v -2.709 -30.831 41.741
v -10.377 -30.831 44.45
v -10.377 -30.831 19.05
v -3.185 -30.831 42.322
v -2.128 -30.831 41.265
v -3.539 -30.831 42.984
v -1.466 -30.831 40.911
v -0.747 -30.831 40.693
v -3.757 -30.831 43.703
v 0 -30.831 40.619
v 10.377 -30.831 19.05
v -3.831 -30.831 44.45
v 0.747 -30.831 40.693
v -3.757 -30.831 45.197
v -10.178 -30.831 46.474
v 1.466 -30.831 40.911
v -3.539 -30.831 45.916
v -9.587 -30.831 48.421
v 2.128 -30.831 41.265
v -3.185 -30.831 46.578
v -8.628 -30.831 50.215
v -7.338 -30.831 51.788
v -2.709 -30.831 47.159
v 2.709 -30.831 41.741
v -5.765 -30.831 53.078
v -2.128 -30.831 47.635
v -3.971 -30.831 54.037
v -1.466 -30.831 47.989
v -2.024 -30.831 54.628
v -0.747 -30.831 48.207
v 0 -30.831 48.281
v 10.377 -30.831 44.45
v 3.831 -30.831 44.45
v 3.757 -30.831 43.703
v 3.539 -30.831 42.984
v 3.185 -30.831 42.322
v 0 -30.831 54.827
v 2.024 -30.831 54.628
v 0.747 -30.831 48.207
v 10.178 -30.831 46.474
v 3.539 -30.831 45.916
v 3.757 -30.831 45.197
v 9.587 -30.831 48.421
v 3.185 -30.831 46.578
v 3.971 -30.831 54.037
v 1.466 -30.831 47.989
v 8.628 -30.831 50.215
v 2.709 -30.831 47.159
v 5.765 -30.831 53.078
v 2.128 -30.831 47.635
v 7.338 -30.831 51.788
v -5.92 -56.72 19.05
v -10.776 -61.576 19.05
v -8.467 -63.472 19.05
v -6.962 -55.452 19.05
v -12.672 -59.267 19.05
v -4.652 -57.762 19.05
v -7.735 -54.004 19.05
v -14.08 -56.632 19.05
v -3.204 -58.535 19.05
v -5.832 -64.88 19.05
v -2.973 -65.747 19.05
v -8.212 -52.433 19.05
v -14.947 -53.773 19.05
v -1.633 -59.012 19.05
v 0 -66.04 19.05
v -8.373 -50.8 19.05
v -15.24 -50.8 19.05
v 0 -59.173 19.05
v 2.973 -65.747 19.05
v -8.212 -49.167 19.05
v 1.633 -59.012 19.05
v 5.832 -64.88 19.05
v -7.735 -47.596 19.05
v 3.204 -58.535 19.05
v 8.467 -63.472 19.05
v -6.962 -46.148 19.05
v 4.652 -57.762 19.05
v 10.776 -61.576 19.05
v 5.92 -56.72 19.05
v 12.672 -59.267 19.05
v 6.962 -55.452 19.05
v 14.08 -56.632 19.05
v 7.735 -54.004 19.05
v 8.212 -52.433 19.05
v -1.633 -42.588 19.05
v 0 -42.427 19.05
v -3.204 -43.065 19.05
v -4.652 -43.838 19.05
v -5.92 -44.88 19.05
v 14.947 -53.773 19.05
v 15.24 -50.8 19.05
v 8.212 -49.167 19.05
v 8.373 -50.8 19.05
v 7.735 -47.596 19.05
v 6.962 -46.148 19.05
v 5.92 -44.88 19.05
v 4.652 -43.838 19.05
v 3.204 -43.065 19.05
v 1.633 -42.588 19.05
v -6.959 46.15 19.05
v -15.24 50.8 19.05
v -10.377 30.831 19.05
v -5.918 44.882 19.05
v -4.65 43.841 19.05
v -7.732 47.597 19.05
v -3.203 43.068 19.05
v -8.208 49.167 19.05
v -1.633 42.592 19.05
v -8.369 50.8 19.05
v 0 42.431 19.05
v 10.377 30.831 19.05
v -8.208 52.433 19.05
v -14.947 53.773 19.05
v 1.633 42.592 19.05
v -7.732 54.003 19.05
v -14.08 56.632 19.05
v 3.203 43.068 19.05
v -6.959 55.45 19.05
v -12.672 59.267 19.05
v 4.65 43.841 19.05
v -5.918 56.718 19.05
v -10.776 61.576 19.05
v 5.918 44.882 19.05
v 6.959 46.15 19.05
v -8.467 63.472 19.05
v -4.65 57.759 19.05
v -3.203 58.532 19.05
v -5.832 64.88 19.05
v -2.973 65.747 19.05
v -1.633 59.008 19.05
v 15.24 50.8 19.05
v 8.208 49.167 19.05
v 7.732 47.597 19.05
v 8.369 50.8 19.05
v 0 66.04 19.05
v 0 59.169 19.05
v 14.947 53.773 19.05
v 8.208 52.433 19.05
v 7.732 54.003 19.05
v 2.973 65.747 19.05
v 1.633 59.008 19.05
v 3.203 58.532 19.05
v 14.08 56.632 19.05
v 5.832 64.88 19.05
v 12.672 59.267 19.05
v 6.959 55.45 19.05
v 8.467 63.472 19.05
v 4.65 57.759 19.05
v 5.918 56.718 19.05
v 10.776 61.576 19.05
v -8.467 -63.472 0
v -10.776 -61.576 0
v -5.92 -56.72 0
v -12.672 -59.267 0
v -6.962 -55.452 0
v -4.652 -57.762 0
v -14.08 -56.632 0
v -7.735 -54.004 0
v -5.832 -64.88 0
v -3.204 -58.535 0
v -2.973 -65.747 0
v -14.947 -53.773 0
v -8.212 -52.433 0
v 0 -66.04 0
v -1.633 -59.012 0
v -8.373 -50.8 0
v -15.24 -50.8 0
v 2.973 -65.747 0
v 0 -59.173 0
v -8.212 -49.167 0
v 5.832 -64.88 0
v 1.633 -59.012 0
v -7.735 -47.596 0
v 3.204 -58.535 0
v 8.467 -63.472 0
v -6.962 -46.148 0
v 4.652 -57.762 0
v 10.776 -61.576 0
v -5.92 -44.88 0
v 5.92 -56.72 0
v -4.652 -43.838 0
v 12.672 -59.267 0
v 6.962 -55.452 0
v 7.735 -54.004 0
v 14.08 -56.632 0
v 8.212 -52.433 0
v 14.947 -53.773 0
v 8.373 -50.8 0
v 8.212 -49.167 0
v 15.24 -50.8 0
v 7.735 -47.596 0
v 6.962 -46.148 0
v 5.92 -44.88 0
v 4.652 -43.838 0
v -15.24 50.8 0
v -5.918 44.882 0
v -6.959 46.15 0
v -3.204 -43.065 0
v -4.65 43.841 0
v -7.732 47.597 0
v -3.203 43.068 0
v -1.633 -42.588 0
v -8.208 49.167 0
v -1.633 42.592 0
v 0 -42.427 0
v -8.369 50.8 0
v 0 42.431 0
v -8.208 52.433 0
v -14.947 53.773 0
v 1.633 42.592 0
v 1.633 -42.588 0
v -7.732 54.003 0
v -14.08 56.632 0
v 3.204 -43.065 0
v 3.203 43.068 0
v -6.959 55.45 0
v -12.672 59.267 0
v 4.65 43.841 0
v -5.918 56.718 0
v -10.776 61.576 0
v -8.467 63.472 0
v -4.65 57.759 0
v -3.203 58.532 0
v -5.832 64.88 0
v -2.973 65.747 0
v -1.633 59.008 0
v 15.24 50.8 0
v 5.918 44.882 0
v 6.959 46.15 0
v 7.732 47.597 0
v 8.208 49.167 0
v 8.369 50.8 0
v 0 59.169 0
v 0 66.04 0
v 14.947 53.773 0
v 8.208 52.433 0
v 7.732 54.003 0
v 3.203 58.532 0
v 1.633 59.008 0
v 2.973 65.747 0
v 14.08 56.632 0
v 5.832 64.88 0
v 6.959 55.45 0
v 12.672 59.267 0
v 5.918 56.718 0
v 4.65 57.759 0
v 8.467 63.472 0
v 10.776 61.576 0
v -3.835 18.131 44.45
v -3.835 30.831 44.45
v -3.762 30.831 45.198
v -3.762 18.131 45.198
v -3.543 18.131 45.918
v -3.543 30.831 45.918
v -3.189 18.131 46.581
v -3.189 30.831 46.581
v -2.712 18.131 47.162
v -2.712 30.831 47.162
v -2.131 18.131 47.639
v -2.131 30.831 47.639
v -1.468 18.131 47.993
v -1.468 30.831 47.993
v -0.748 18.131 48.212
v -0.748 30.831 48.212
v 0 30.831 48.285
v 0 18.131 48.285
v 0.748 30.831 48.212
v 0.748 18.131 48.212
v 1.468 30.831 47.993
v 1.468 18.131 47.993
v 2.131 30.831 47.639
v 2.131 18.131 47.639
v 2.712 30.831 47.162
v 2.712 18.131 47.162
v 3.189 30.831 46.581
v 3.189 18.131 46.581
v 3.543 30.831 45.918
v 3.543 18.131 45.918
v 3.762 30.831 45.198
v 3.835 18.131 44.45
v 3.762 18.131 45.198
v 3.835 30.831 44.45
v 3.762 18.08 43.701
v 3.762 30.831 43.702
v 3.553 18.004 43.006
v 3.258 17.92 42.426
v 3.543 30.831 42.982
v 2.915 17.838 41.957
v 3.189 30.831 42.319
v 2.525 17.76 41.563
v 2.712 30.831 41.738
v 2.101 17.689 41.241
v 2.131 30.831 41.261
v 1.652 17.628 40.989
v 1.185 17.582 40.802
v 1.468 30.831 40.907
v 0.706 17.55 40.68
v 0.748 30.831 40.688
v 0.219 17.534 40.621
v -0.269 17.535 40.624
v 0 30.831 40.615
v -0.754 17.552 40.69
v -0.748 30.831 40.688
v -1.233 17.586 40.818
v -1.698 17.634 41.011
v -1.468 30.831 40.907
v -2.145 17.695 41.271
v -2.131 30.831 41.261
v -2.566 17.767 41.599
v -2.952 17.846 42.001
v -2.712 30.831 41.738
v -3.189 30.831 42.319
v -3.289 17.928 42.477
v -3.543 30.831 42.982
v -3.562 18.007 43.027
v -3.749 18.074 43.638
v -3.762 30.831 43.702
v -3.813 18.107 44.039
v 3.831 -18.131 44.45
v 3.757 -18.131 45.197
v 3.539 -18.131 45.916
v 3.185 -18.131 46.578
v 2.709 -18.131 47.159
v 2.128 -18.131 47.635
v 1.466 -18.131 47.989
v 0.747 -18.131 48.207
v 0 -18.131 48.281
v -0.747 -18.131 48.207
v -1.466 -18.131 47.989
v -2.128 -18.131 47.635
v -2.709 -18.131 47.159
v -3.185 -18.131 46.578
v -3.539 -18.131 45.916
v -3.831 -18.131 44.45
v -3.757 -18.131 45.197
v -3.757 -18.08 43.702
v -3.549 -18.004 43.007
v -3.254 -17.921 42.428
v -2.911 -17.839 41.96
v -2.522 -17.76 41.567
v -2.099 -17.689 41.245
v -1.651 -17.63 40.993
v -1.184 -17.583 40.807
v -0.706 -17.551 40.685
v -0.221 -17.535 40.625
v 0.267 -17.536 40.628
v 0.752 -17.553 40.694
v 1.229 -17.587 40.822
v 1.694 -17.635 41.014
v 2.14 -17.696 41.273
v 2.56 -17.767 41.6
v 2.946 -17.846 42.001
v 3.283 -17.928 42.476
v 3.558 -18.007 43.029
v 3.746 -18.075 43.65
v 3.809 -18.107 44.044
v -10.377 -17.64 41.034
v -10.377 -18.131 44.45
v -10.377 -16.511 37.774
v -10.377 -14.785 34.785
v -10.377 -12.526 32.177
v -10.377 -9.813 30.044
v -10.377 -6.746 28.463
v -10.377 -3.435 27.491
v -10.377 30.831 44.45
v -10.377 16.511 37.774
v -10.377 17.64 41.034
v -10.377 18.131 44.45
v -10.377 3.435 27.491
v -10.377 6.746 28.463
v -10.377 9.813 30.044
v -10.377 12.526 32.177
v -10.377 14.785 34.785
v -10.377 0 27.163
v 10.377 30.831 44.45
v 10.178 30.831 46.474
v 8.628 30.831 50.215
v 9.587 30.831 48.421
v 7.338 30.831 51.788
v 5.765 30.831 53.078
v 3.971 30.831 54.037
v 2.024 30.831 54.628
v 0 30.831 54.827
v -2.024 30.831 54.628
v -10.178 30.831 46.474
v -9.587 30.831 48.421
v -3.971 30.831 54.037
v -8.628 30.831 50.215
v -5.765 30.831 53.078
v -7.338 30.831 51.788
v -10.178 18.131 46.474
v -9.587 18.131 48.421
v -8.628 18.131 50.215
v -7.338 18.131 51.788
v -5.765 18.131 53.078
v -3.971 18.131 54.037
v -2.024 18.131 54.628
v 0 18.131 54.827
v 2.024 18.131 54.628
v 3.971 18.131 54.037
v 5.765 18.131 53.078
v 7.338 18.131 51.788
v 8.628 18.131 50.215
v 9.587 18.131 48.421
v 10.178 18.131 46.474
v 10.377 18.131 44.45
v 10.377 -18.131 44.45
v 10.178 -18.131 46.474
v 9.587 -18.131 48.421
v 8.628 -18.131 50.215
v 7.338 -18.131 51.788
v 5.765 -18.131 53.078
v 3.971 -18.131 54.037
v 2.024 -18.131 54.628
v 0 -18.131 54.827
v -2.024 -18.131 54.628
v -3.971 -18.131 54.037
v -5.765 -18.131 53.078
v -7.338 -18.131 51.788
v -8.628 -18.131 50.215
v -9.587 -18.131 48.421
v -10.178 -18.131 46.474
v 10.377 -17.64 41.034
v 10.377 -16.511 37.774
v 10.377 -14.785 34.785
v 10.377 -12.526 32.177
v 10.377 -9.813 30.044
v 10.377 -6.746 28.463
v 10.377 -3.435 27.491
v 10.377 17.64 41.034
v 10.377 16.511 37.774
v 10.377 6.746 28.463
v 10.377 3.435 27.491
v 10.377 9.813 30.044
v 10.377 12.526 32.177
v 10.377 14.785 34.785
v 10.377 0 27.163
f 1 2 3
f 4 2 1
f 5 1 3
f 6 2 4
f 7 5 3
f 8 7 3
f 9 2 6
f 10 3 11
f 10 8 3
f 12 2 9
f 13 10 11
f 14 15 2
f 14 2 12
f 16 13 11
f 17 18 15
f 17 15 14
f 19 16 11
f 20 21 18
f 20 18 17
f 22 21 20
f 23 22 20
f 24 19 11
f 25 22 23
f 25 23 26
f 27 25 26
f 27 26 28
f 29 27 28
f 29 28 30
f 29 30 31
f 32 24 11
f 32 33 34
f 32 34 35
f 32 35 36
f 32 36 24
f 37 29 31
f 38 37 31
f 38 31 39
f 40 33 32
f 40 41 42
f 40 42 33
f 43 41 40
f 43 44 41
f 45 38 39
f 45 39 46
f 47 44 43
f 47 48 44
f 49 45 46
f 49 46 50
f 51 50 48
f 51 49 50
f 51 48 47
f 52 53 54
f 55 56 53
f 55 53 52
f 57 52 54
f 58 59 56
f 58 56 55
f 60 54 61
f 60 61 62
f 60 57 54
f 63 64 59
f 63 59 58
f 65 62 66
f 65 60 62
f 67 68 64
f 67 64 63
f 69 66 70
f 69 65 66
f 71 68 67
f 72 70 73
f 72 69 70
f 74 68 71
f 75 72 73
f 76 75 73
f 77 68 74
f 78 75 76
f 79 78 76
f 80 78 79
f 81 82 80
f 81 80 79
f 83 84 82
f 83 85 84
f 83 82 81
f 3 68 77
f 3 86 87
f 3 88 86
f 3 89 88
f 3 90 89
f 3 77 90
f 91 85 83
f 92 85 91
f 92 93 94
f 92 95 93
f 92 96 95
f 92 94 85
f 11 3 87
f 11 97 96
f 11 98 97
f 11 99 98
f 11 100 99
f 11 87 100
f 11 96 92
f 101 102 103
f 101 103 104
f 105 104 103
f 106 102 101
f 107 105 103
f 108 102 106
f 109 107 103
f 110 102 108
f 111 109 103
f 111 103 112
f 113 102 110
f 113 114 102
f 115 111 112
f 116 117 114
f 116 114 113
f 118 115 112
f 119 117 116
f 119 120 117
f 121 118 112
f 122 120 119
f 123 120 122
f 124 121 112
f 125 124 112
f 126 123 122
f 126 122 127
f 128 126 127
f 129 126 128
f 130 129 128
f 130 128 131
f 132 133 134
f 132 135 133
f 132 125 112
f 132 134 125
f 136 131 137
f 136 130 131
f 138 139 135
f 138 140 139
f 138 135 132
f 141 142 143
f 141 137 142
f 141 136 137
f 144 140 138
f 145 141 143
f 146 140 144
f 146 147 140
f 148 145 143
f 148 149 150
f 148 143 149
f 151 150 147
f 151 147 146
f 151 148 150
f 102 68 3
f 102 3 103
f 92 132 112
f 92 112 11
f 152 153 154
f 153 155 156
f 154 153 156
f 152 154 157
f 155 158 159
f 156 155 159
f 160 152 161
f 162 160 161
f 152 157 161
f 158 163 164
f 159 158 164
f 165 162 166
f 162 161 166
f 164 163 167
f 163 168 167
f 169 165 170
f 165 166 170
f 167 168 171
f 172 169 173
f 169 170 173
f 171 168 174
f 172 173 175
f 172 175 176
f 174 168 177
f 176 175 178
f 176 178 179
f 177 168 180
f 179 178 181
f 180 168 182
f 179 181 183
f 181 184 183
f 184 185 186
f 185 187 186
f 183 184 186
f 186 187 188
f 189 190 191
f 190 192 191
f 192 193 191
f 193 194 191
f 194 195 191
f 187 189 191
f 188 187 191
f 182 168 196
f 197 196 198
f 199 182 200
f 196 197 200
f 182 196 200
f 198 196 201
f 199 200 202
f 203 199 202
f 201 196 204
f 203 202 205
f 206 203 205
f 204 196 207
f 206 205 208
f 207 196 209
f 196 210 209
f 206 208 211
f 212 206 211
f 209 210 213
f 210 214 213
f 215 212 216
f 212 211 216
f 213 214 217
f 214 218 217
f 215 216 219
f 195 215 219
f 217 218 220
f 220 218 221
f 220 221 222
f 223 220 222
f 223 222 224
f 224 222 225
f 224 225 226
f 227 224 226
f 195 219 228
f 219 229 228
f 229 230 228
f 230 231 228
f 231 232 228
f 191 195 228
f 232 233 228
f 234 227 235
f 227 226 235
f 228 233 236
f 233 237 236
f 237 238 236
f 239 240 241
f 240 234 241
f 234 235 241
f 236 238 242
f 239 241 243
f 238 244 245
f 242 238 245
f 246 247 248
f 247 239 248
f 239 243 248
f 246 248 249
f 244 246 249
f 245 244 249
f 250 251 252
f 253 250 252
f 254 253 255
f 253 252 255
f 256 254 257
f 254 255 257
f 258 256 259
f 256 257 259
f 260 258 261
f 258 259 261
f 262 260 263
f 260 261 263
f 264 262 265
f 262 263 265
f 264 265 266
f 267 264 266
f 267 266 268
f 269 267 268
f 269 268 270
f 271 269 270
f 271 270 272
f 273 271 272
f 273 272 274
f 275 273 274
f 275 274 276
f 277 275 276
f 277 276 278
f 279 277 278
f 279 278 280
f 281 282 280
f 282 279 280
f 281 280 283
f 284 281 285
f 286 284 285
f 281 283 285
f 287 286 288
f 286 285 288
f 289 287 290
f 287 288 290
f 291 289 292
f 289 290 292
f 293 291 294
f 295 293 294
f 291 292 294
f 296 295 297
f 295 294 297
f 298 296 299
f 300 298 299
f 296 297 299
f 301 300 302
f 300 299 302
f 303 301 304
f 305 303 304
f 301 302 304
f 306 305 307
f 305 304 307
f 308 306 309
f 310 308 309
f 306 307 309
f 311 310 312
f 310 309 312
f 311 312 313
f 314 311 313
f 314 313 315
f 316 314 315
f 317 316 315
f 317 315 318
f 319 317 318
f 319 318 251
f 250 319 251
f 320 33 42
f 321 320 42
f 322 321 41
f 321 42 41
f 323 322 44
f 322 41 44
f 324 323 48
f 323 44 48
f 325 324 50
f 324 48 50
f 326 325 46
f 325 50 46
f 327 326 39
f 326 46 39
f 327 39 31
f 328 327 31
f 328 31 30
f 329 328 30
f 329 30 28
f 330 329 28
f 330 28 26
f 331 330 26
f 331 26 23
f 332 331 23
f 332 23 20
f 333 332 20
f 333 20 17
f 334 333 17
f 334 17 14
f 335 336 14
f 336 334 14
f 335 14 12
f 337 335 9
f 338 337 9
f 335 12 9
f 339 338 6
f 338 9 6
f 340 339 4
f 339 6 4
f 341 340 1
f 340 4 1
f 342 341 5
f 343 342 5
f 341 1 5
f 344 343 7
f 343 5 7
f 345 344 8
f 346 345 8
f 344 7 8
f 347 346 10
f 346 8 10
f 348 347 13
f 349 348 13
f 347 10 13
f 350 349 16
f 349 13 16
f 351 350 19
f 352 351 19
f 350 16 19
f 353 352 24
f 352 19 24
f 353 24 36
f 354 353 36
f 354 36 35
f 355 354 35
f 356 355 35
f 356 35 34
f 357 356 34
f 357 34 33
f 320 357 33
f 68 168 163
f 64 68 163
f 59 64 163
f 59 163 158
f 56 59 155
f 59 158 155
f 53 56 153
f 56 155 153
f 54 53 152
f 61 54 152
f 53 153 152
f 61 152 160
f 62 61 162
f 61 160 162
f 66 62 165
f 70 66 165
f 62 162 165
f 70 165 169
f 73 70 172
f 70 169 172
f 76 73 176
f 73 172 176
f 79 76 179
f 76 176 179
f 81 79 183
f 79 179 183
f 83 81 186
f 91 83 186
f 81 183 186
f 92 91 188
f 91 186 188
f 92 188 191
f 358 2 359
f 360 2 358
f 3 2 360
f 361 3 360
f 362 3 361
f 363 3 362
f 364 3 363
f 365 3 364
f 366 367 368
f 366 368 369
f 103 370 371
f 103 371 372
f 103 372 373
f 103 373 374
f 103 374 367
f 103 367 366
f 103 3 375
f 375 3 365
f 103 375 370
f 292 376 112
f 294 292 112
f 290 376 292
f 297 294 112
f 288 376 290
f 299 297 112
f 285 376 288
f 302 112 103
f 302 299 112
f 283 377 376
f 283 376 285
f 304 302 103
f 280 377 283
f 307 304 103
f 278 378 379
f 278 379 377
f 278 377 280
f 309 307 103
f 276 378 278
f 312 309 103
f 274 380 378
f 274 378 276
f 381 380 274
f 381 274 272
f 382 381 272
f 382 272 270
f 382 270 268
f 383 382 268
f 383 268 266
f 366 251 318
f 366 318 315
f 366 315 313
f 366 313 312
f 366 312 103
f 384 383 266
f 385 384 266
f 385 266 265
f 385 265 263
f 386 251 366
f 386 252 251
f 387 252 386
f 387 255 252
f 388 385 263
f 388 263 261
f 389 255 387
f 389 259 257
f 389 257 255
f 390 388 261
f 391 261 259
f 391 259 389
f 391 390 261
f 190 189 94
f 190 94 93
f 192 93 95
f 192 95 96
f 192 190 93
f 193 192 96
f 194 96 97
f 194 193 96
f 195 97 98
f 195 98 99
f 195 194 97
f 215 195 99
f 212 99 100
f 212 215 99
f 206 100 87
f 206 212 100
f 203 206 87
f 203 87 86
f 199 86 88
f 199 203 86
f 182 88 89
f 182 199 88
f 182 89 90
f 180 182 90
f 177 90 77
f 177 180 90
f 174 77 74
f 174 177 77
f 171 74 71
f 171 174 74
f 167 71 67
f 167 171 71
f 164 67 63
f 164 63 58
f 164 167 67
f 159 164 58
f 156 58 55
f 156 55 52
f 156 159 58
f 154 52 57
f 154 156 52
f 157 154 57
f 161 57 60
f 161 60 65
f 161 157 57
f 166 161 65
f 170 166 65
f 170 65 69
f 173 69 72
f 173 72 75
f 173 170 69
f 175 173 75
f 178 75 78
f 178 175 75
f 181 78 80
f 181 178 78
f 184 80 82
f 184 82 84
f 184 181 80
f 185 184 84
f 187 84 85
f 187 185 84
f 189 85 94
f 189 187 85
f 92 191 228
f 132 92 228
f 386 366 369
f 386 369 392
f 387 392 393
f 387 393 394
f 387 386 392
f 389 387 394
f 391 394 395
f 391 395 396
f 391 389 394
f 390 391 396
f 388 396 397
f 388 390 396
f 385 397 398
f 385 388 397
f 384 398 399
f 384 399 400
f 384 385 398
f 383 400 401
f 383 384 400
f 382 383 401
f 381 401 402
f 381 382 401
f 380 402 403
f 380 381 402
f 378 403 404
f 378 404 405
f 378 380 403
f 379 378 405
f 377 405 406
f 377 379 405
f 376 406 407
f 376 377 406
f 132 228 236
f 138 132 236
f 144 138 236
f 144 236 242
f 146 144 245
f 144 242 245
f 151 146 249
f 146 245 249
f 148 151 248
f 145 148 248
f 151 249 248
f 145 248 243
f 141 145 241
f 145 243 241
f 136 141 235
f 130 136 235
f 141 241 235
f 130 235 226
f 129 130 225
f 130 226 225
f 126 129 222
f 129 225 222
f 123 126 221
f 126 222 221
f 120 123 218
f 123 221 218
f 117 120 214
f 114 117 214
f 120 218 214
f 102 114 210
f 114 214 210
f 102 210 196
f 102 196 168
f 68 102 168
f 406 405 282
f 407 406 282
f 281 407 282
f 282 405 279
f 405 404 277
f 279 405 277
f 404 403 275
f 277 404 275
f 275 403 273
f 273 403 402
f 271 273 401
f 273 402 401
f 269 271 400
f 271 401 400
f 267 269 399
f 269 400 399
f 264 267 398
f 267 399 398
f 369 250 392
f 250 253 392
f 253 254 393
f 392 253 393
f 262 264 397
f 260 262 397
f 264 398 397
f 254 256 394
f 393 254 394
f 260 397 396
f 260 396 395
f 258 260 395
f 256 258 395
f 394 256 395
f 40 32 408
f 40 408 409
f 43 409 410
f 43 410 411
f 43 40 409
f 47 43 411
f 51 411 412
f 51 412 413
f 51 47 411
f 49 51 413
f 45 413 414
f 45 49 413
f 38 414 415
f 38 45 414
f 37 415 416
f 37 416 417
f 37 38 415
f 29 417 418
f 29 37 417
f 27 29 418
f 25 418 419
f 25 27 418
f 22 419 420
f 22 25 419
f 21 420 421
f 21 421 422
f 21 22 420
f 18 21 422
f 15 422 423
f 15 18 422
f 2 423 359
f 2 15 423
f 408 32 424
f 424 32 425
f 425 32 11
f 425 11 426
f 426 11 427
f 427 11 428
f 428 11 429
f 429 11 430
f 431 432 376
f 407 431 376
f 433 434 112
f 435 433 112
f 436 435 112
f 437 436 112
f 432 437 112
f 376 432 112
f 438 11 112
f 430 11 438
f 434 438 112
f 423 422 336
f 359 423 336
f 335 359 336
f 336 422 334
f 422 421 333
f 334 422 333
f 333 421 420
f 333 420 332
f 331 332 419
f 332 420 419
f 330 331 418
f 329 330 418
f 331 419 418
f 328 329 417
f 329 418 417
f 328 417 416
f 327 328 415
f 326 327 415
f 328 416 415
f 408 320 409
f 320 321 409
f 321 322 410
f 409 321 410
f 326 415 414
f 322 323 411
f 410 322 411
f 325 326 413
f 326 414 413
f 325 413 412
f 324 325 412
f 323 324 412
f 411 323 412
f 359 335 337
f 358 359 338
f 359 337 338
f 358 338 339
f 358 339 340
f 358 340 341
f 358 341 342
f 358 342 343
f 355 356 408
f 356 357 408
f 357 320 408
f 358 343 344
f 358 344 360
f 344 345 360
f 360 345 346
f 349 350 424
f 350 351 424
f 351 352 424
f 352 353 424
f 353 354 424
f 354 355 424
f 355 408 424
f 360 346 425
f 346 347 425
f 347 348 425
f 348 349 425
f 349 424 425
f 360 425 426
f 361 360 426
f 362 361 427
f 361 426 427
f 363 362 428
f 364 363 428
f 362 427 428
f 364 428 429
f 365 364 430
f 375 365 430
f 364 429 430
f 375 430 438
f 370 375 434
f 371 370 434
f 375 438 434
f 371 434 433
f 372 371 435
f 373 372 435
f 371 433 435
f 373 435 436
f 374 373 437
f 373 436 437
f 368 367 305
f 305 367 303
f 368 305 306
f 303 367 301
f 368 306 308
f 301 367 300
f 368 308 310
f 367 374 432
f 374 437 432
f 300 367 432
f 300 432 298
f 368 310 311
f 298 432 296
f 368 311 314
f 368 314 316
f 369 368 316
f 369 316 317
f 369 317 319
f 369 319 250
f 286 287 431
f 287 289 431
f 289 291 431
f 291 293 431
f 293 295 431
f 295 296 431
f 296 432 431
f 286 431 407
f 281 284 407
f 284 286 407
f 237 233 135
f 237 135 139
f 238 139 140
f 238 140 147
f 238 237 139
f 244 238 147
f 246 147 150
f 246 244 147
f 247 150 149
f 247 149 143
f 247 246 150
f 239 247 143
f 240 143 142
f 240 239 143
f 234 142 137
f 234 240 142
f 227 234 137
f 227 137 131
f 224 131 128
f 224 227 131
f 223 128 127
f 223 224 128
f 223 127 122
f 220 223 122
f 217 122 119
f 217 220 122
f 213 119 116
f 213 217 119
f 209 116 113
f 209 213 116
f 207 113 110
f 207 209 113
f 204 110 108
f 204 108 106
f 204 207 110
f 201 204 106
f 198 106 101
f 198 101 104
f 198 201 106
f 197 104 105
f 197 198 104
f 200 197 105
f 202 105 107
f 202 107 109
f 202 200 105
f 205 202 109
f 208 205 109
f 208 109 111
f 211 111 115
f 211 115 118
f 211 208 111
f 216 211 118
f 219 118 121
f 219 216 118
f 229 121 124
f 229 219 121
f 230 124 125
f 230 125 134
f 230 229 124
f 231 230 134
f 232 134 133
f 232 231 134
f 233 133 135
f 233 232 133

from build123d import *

# Parameters (mm, degrees)
F0_R      = 8.37282
F0_R_2    = 8.3693
F1_DEPTH  = 19.05
F2_W      = 20.754474
F2_H      = 61.66184
F3_DEPTH  = 25.4
F5_DEPTH  = 25.4
F7_DEPTH  = 12.7
F6_R      = 3.8309
F8_DEPTH  = 15.24
F10_DEPTH = 12.7
F9_R      = 3.8354
F11_DEPTH = 15.24


with BuildPart() as f1:
    # F0 (on Top) → F1 (new body)
    with BuildSketch(Plane.XY):
        with BuildLine():
            Line((-15.24, 50.8), (-15.24, 0))
            Line((-15.24, 0), (-15.24, -50.8))
            ThreePointArc((-15.24, -50.8), (0, -66.04), (15.24, -50.8))
            Line((15.24, -50.8), (15.24, 0))
            Line((15.24, 0), (15.24, 50.8))
            ThreePointArc((15.24, 50.8), (0, 66.04), (-15.24, 50.8))
        make_face()
        with Locations((0, -50.8)):
            Circle(F0_R, mode=Mode.SUBTRACT)
        with Locations((0, 50.8)):
            Circle(F0_R_2, mode=Mode.SUBTRACT)
    extrude(amount=F1_DEPTH)

    # F2 (on face) → F3 (join)
    with BuildSketch(Plane.XY.offset(19.05)):
        Rectangle(F2_W, F2_H)
    extrude(amount=F3_DEPTH)

    # F4 (on face) → F5 (cut)
    with BuildSketch(Plane.YZ.offset(10.377237)):
        with BuildLine():
            Line((18.13092, 44.45), (-18.13092, 44.45))
            ThreePointArc((-18.13092, 44.45), (0, 27.163165), (18.13092, 44.45))
        make_face()
    extrude(amount=-F5_DEPTH, mode=Mode.SUBTRACT)

    # F6 (on face) → F7 (join)
    with BuildSketch(Plane.XZ.offset(30.83092)):
        with BuildLine():
            Line((3.8309, 44.45), (10.377237, 44.45))
            ThreePointArc((10.377237, 44.45), (0, 54.827237), (-10.377237, 44.45))
            Line((-10.377237, 44.45), (-3.8309, 44.45))
            ThreePointArc((-3.8309, 44.45), (0, 48.2809), (3.8309, 44.45))
        make_face()
    extrude(amount=-F7_DEPTH)

    # F6 (on face) → F8 (cut)
    with BuildSketch(Plane.XZ.offset(30.83092)):
        with Locations((0, 44.45)):
            Circle(F6_R)
    extrude(amount=-F8_DEPTH, mode=Mode.SUBTRACT)

    # F9 (on face) → F10 (join)
    with BuildSketch(Plane(origin=(0, 30.83092, 0), x_dir=(-1, 0, 0), z_dir=(0, 1, 0))):
        with BuildLine():
            Line((3.8354, 44.45), (10.377237, 44.45))
            ThreePointArc((10.377237, 44.45), (0, 54.827237), (-10.377237, 44.45))
            Line((-10.377237, 44.45), (-3.8354, 44.45))
            ThreePointArc((-3.8354, 44.45), (0, 48.2854), (3.8354, 44.45))
        make_face()
    extrude(amount=-F10_DEPTH)

    # F9 (on face) → F11 (cut)
    with BuildSketch(Plane(origin=(0, 30.83092, 0), x_dir=(-1, 0, 0), z_dir=(0, 1, 0))):
        with Locations((0, 44.45)):
            Circle(F9_R)
    extrude(amount=-F11_DEPTH, mode=Mode.SUBTRACT)


solid = f1.part
